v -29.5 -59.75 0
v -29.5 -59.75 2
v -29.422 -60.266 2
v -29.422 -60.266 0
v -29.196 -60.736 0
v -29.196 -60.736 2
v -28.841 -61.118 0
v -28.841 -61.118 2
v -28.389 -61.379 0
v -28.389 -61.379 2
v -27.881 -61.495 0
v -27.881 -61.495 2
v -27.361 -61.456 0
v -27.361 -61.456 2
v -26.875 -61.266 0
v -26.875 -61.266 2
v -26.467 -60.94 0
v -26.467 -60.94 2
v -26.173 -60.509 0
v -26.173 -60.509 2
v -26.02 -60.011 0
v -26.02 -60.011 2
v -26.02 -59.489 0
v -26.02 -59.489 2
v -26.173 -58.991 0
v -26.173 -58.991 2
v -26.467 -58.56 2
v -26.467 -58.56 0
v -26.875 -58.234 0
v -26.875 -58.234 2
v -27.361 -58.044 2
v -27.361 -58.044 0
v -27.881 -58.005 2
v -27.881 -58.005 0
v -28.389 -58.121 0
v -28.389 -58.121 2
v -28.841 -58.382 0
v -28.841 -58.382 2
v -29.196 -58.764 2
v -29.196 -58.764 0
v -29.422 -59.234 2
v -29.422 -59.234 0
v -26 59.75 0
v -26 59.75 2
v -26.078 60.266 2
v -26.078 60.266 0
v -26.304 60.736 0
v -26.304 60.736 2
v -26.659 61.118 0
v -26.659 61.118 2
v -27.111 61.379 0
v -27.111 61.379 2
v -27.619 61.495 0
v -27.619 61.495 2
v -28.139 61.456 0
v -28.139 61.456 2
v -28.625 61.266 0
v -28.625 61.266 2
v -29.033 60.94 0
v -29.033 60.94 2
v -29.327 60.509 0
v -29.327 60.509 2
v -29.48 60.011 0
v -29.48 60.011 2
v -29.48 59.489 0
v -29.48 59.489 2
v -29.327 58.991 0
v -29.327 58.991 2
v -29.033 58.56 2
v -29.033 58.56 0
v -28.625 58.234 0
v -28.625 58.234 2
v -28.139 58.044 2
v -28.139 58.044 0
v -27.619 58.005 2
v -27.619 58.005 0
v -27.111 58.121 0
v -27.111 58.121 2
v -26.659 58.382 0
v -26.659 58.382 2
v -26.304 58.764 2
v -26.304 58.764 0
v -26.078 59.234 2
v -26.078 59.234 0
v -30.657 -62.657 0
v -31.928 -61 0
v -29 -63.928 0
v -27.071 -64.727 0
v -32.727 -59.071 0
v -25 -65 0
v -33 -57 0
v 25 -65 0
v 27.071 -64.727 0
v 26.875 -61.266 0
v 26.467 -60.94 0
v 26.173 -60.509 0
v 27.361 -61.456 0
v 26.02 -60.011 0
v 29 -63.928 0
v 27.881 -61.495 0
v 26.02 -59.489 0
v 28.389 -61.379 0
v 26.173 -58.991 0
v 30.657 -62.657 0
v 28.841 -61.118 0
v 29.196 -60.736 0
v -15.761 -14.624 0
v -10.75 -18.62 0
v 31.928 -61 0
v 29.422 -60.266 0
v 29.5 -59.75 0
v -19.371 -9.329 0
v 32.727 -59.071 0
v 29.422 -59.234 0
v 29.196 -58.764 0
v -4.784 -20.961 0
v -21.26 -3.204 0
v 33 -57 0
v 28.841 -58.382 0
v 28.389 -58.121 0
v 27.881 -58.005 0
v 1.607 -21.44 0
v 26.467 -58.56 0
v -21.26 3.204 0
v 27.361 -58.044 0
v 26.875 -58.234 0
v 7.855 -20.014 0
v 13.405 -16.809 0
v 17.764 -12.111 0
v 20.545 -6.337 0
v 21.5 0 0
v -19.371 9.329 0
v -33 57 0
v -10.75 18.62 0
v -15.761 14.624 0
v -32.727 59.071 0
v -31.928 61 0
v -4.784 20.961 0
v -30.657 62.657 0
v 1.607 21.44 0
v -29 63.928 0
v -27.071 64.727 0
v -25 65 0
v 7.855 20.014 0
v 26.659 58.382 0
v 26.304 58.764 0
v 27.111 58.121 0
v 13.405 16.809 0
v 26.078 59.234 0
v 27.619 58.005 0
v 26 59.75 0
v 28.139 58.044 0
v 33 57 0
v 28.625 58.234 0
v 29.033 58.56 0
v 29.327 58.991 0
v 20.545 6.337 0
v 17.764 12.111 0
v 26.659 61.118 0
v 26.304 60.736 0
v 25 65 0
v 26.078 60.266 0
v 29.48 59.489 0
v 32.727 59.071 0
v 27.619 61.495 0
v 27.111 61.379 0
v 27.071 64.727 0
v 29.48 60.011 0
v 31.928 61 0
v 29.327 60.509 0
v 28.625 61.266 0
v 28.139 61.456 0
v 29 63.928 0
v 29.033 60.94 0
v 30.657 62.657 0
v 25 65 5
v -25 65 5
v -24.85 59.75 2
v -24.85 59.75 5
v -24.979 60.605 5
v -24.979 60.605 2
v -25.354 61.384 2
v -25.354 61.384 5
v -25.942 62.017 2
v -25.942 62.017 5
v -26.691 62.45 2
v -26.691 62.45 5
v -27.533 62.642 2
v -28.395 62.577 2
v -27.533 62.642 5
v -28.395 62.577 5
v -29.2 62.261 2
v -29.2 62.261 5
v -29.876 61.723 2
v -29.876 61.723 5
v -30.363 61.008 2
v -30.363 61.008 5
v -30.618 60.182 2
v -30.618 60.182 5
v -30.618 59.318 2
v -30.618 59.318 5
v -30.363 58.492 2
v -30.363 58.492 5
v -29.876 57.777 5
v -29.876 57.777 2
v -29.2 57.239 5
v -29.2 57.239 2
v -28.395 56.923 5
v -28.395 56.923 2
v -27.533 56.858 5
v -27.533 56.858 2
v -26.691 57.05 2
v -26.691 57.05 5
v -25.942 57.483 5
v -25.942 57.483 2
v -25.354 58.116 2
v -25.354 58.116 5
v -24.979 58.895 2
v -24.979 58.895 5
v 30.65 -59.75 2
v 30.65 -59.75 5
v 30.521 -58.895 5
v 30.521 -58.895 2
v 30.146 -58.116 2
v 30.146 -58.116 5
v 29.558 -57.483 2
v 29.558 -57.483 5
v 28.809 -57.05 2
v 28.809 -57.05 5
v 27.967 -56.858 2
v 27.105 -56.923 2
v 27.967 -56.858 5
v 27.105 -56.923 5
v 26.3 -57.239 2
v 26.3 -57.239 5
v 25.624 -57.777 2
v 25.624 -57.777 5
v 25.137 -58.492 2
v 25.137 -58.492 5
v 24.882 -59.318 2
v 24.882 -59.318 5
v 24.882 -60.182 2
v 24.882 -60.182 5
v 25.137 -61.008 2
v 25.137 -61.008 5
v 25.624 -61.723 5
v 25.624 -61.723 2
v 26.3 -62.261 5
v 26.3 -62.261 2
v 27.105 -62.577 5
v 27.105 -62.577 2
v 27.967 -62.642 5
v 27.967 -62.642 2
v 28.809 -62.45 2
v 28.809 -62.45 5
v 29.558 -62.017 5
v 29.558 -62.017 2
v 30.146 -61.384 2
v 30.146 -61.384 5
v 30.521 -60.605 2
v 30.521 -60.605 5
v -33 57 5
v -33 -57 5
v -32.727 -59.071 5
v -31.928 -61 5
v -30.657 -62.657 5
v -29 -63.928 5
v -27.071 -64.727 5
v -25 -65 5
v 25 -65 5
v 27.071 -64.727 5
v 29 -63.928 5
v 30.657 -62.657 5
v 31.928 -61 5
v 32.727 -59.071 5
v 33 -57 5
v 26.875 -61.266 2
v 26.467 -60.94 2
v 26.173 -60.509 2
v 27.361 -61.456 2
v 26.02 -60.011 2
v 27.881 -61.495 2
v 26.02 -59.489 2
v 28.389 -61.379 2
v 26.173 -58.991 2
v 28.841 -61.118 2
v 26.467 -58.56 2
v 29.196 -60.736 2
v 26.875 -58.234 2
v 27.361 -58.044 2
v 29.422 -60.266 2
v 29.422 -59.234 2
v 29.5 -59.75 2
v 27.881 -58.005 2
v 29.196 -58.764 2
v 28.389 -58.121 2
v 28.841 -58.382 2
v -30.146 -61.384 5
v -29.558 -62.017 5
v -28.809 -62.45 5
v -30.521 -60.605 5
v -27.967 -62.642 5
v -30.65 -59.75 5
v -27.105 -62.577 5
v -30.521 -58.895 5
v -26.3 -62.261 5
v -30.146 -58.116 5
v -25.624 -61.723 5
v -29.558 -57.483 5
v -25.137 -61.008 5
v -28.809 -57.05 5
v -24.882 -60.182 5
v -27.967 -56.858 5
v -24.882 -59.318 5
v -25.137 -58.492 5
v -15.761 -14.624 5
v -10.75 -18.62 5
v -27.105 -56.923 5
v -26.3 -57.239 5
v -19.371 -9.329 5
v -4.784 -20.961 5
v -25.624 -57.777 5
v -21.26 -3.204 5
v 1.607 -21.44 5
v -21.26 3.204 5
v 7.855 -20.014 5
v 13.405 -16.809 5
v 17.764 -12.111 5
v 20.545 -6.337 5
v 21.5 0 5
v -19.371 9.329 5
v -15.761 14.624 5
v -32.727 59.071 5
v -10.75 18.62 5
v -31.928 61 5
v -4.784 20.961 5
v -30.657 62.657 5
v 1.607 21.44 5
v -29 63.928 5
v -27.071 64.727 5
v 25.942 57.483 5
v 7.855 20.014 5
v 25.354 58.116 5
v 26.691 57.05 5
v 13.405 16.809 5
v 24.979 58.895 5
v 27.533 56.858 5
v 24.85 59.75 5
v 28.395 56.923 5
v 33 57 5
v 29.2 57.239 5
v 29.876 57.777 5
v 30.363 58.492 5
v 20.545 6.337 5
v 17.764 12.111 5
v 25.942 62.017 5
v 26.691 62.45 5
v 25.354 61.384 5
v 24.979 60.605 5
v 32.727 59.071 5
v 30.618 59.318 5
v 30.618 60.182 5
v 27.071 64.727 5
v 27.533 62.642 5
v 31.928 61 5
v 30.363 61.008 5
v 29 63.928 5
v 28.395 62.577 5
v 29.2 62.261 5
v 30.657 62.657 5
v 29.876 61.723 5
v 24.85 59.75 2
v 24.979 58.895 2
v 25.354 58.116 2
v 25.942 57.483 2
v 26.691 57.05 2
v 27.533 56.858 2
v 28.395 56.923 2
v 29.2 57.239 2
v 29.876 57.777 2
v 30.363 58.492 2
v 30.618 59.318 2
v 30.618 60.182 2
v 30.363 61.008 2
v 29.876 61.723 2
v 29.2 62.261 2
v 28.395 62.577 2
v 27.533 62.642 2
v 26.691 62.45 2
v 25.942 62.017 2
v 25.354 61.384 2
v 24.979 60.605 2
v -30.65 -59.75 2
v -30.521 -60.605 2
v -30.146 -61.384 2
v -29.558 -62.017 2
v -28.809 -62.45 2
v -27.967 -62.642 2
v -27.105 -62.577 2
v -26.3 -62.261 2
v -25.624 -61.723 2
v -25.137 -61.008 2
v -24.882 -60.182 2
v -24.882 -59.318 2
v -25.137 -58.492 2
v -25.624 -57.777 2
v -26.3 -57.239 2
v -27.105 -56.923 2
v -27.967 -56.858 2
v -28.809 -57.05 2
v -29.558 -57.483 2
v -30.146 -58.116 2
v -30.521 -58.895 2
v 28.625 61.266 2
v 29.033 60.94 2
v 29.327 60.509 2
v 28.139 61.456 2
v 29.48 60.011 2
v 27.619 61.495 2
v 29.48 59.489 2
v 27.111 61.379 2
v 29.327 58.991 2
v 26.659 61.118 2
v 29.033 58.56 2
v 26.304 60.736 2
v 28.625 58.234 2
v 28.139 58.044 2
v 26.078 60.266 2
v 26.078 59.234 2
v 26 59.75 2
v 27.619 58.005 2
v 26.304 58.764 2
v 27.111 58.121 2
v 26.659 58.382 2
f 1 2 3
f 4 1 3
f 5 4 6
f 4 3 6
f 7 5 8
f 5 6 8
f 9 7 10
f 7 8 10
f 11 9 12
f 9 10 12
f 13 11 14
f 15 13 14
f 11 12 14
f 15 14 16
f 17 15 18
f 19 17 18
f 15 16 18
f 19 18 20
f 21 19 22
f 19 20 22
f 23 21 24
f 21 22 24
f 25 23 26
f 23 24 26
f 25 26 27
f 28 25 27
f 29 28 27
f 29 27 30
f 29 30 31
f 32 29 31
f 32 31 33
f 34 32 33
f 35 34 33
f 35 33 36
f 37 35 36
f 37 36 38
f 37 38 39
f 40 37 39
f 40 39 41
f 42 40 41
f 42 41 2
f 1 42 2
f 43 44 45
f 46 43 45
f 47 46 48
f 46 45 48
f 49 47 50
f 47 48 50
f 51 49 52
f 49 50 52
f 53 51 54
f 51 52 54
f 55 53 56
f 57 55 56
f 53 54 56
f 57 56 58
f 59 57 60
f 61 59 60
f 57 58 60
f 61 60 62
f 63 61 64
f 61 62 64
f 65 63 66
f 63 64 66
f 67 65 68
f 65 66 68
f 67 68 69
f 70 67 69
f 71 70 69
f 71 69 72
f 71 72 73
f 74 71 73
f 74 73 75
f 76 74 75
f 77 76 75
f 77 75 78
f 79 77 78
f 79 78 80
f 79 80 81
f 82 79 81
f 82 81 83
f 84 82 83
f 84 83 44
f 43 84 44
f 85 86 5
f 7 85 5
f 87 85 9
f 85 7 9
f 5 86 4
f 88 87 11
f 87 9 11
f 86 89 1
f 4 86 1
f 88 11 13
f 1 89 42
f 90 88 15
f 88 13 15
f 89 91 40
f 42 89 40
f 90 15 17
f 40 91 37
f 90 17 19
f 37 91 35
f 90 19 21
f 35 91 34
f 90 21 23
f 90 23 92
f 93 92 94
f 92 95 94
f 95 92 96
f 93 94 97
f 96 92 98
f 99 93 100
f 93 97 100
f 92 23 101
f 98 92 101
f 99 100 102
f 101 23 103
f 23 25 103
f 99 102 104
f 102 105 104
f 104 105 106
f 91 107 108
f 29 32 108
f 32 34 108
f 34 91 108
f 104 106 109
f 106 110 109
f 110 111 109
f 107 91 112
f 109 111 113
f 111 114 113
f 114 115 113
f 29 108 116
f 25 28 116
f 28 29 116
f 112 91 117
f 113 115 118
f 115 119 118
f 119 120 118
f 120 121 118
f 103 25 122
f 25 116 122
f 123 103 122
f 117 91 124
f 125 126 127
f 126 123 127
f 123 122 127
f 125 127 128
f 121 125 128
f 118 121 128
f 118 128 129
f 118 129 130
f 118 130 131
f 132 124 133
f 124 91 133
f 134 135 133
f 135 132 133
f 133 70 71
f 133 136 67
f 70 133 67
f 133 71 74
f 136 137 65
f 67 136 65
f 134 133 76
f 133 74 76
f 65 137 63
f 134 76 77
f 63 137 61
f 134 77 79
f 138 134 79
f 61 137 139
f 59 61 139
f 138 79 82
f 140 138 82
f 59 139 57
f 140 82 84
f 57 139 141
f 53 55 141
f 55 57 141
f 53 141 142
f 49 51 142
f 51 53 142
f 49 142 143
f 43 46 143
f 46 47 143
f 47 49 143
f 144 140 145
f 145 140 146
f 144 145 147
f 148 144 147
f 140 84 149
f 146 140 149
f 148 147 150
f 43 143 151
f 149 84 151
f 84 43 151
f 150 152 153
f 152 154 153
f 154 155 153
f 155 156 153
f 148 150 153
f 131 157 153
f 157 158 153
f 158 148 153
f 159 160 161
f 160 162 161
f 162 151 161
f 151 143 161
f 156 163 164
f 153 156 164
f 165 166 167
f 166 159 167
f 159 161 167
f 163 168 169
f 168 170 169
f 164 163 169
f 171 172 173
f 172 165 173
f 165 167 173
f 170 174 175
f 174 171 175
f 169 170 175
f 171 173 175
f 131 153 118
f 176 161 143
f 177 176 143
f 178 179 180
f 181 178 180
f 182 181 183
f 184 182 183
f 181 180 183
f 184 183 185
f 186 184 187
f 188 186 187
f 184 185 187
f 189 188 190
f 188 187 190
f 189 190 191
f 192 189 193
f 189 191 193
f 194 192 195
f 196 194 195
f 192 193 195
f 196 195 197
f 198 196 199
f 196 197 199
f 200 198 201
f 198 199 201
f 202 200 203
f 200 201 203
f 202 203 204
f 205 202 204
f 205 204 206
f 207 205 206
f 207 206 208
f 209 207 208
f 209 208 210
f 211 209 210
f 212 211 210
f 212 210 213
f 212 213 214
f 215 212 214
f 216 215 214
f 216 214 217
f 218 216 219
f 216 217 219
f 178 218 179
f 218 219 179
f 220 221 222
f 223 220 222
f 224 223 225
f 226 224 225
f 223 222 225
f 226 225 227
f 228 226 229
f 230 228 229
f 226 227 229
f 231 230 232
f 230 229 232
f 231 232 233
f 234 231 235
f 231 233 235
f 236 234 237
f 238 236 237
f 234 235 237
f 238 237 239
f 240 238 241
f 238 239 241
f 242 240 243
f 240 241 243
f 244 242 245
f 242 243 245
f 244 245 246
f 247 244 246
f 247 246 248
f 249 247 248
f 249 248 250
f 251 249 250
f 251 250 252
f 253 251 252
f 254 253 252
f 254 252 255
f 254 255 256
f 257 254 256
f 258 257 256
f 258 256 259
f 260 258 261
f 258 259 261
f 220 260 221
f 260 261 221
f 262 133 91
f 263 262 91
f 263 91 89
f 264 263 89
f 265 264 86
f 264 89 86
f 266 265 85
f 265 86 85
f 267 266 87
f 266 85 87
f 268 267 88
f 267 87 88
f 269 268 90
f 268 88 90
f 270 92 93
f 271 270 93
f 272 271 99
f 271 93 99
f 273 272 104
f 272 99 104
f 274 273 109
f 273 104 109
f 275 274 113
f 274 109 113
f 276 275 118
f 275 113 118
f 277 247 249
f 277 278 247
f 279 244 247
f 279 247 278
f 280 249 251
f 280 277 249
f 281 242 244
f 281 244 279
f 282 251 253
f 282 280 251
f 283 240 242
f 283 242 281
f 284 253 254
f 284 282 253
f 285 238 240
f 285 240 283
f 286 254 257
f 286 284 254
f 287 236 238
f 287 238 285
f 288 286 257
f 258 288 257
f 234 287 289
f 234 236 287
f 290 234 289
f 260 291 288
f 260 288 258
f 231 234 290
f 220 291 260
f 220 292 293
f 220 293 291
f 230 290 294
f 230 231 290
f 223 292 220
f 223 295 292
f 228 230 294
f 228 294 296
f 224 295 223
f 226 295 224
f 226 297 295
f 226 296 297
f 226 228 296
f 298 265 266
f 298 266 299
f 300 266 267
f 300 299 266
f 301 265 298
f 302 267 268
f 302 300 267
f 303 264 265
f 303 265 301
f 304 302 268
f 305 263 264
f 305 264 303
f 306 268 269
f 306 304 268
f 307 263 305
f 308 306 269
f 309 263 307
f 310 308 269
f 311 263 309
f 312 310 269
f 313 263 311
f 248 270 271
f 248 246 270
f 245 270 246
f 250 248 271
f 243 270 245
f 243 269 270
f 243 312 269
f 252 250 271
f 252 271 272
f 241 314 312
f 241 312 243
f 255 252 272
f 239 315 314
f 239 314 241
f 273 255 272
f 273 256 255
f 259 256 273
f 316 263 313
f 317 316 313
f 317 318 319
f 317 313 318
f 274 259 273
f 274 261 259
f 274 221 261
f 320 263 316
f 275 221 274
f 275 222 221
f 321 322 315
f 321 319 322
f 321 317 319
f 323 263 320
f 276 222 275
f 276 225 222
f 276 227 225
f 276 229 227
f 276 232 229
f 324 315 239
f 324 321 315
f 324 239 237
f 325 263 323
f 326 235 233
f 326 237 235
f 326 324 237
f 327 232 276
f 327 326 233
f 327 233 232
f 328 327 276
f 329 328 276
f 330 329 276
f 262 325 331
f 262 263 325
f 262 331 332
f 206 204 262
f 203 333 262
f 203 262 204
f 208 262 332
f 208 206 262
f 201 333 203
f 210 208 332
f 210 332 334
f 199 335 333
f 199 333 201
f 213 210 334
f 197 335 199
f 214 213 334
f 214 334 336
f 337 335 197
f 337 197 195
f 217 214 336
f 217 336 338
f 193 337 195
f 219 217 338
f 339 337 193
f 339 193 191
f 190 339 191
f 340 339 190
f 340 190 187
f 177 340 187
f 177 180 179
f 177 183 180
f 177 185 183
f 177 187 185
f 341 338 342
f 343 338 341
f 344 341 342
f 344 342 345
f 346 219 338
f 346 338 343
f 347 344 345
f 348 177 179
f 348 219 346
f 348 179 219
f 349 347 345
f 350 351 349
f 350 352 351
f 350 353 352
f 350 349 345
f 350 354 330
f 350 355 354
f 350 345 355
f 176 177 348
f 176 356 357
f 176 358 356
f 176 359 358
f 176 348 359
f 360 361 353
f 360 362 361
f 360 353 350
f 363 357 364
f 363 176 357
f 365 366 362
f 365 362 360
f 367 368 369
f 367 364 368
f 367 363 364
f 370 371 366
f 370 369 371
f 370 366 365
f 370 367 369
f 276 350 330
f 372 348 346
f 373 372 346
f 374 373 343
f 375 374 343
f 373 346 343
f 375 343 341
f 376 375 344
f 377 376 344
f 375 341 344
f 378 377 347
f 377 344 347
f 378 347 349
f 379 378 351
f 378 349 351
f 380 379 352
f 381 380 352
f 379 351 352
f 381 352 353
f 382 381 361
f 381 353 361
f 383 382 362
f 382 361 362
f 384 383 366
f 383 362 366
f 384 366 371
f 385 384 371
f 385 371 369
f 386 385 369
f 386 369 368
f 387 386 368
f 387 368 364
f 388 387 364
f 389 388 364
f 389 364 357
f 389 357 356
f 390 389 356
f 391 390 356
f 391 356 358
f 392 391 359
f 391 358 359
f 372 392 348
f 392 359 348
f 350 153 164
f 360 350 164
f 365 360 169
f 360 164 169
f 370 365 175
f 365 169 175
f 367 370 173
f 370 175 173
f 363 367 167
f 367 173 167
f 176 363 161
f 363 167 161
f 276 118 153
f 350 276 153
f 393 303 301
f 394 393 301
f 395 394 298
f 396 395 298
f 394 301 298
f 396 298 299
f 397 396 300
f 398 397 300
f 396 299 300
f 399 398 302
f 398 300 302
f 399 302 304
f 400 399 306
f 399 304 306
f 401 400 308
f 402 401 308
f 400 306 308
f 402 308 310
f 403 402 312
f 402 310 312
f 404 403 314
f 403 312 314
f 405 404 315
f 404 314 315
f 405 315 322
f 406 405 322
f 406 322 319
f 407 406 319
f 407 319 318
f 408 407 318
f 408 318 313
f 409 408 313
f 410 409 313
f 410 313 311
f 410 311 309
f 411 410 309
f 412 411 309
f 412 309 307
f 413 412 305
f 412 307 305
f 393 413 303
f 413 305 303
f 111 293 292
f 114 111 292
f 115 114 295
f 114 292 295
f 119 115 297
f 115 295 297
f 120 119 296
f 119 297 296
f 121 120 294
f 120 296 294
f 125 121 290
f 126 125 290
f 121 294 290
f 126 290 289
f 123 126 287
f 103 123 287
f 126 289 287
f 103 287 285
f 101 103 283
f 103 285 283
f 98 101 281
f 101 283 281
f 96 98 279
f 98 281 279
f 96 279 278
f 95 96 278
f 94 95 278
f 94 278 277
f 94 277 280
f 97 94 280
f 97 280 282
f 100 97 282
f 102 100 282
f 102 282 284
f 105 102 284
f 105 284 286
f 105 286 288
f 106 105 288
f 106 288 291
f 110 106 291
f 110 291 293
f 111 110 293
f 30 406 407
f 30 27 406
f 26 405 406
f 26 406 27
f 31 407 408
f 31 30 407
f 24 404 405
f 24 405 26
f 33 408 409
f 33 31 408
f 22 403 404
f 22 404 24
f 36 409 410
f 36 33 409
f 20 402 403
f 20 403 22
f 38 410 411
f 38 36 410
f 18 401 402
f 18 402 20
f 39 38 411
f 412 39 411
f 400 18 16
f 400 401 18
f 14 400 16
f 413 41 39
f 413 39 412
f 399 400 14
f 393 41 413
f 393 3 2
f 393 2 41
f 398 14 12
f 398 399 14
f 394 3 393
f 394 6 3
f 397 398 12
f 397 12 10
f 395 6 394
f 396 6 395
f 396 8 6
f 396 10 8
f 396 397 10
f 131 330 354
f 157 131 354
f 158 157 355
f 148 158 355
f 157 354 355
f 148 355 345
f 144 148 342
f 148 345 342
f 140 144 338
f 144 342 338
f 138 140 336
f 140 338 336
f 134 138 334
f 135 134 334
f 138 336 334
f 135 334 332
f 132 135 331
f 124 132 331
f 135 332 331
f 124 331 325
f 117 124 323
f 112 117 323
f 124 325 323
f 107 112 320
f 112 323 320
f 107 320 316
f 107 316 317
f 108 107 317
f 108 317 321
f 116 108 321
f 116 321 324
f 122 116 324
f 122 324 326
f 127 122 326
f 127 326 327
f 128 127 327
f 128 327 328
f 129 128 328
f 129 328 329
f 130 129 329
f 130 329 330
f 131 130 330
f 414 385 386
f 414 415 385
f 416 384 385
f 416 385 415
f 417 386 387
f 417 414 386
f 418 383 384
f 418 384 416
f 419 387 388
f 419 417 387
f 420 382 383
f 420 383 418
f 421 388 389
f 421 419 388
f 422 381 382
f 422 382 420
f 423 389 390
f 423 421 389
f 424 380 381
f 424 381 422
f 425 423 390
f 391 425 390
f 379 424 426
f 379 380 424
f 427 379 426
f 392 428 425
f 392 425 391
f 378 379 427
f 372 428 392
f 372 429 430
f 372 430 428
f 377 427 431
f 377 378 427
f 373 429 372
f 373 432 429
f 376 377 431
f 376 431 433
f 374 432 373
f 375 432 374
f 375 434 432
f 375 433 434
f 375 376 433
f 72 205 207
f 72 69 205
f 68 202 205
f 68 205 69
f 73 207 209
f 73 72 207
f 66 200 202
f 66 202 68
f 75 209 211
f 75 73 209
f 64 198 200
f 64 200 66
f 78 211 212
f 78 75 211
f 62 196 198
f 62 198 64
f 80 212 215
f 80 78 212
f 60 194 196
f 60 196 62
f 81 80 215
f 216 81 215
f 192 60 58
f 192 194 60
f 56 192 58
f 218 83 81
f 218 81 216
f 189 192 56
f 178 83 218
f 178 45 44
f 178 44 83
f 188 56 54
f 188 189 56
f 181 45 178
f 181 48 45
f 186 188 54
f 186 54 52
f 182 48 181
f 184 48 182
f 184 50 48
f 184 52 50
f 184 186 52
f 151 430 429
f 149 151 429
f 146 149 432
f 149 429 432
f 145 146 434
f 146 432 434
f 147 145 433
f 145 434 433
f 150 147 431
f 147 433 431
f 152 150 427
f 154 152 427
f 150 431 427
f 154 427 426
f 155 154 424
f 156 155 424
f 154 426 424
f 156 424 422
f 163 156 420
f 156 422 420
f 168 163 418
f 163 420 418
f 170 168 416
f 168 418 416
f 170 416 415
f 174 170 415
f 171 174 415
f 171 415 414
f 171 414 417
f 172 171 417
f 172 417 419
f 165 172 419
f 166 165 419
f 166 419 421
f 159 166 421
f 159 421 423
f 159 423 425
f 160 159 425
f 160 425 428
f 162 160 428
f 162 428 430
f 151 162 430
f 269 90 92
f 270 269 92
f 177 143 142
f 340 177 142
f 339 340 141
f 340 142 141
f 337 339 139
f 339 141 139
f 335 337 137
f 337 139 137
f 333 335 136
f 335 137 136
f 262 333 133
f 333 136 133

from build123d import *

# Parameters (mm, degrees)
BOSS_EXTRUDE1_DEPTH = 5
SKETCH2_R           = 21.5
CUT_EXTRUDE1_DEPTH  = 74.068461049
SKETCH12_R          = 2.9
CUT_EXTRUDE3_DEPTH  = 3
SKETCH13_R          = 1.75
CUT_EXTRUDE4_DEPTH  = 73.958892535


with BuildPart() as part:
    # Sketch1 → Boss-Extrude1 (new body)
    with BuildSketch(Plane.XY):
        with BuildLine():
            Line((25, 65), (-25, 65))
            ThreePointArc((-25, 65), (-30.656854249, 62.656854249), (-33, 57))
            Line((-33, 57), (-33, -57))
            ThreePointArc((-33, -57), (-30.656854249, -62.656854249), (-25, -65))
            Line((-25, -65), (25, -65))
            ThreePointArc((25, -65), (30.656854249, -62.656854249), (33, -57))
            Line((33, -57), (33, 57))
            ThreePointArc((33, 57), (30.656854249, 62.656854249), (25, 65))
        make_face()
    extrude(amount=BOSS_EXTRUDE1_DEPTH)

    # Sketch2 → Cut-Extrude1 (cut, through all)
    with BuildSketch(Plane.XY.offset(5)):
        Circle(SKETCH2_R)
    extrude(amount=-CUT_EXTRUDE1_DEPTH, mode=Mode.SUBTRACT)

    # Sketch12 → Cut-Extrude3 (cut)
    with BuildSketch(Plane.XY.offset(5)):
        with Locations((-27.75, 59.75)):
            Circle(SKETCH12_R)
        with Locations(Location((27.75, 59.75, 0), (0, 0, 180))):
            Circle(SKETCH12_R)
        with Locations(Location((-27.75, -59.75, 0), (0, 0, 180))):
            Circle(SKETCH12_R)
        with Locations((27.75, -59.75)):
            Circle(SKETCH12_R)
    extrude(amount=-CUT_EXTRUDE3_DEPTH, mode=Mode.SUBTRACT)

    # Sketch13 → Cut-Extrude4 (cut, through all)
    with BuildSketch(Plane.XY.offset(2)):
        with Locations((-27.75, 59.75)):
            Circle(SKETCH13_R)
        with Locations(Location((27.75, 59.75, 0), (0, 0, 180))):
            Circle(SKETCH13_R)
        with Locations((27.75, -59.75)):
            Circle(SKETCH13_R)
        with Locations(Location((-27.75, -59.75, 0), (0, 0, 180))):
            Circle(SKETCH13_R)
    extrude(amount=-CUT_EXTRUDE4_DEPTH, mode=Mode.SUBTRACT)


solid = part.part
